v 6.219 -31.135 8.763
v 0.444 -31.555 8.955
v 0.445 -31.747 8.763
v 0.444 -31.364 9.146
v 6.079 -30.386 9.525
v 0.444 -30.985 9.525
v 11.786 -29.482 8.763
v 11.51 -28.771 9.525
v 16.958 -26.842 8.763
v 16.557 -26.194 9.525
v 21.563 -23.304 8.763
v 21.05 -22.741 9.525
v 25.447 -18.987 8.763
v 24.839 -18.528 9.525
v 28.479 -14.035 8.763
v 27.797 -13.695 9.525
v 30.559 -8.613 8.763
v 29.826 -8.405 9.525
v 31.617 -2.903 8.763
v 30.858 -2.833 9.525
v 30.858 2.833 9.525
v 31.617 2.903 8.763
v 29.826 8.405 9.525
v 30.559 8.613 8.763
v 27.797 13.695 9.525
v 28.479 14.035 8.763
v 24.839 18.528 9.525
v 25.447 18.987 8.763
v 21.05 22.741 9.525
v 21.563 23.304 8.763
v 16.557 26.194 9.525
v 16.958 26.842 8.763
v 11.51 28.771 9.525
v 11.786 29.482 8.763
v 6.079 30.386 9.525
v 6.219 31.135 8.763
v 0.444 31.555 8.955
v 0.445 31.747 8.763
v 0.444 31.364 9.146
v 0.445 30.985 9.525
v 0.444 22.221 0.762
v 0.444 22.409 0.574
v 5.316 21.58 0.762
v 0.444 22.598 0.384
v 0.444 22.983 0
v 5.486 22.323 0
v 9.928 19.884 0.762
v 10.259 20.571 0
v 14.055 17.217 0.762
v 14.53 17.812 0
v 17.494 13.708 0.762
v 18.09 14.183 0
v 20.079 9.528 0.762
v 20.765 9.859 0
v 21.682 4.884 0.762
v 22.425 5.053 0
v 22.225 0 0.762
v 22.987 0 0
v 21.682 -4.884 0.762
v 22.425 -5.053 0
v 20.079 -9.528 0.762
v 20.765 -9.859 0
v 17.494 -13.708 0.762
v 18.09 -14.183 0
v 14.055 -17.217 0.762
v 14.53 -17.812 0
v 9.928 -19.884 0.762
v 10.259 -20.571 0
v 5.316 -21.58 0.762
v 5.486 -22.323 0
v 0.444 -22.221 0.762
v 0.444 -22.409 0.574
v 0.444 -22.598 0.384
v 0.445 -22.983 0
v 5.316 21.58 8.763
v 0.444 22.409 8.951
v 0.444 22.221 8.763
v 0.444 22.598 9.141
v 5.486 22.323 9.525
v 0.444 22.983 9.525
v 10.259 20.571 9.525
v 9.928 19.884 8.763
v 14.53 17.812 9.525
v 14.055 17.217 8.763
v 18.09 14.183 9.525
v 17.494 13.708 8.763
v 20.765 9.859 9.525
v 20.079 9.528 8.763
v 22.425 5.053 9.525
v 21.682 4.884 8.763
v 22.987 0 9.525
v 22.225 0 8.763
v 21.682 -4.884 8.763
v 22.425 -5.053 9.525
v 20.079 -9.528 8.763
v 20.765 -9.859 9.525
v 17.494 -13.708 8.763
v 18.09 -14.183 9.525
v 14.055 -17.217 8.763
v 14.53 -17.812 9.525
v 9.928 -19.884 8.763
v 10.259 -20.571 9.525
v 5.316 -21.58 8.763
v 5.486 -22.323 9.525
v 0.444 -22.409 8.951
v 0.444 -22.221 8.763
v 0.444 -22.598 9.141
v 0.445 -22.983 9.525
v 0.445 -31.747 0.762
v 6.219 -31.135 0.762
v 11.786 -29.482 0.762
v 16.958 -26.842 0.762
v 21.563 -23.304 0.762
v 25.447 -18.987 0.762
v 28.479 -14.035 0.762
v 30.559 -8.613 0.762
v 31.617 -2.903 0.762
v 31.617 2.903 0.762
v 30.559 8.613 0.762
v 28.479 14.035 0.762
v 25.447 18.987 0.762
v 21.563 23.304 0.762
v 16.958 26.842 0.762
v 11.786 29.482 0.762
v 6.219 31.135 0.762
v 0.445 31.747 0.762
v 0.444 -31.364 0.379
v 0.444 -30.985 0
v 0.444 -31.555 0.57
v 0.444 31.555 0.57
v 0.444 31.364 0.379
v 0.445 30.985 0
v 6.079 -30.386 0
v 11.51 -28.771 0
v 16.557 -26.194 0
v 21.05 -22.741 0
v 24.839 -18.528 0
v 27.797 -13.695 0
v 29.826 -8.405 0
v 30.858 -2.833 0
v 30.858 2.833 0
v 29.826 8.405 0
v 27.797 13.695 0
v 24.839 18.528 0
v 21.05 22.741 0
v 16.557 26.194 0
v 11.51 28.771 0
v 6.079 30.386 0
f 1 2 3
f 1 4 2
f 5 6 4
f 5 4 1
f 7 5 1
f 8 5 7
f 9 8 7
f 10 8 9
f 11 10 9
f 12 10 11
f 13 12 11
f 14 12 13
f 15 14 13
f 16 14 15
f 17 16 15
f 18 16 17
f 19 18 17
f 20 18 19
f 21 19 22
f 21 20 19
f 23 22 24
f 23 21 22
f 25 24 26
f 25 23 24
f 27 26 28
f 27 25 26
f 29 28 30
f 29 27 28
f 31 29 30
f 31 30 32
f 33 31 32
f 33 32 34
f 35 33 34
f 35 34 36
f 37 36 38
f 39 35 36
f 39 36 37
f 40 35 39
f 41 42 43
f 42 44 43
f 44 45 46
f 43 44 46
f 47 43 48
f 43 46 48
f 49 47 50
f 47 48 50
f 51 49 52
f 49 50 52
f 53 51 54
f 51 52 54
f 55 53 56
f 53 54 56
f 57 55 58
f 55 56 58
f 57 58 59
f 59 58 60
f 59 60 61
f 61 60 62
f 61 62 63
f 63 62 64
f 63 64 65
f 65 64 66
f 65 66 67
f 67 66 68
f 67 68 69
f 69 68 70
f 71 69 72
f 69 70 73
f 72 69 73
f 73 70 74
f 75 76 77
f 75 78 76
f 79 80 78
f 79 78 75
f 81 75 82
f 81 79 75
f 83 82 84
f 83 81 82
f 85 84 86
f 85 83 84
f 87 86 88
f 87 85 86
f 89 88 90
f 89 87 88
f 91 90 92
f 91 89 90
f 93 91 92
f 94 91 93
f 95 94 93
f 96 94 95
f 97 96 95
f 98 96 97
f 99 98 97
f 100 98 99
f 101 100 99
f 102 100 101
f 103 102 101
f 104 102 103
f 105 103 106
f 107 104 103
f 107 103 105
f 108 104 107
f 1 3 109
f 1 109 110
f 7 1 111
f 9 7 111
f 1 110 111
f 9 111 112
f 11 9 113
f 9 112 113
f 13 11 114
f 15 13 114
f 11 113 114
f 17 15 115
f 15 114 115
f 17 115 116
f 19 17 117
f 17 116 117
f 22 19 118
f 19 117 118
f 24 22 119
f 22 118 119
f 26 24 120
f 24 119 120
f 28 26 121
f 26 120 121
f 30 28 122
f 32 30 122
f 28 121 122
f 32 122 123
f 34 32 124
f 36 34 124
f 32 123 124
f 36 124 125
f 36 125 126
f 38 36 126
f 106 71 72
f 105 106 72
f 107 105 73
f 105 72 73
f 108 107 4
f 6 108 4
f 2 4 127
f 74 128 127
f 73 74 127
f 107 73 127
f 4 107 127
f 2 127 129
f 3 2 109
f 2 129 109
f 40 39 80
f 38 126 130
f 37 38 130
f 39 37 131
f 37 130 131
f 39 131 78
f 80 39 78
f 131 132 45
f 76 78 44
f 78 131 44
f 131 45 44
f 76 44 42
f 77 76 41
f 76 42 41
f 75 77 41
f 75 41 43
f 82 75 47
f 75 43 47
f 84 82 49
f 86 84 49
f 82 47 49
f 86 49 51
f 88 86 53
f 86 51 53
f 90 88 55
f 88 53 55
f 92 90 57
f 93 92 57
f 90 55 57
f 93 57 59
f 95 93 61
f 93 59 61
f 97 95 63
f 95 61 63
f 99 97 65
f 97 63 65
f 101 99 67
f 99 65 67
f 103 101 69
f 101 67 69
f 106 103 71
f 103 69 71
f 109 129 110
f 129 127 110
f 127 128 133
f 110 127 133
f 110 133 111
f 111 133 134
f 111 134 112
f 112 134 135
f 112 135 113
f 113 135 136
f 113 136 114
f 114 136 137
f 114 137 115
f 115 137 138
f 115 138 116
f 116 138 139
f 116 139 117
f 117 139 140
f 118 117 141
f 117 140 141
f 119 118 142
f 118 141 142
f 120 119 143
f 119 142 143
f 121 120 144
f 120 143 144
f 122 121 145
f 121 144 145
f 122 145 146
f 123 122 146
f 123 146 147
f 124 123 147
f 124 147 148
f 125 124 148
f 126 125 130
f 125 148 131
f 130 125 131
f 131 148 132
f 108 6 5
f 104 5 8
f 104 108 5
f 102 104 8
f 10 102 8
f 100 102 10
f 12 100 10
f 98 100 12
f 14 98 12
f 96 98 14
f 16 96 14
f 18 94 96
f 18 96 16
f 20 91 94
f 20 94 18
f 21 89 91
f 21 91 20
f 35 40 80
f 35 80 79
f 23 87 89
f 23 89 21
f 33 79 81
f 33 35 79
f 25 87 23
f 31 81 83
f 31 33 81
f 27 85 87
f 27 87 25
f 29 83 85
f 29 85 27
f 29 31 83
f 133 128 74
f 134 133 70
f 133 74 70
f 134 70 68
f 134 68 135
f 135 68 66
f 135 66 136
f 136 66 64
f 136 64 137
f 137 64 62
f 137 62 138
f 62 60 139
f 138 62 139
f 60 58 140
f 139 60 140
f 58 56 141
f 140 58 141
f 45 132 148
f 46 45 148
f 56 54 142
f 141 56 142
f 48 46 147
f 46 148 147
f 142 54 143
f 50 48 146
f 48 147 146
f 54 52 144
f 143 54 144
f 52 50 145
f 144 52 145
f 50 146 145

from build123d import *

# Parameters (mm, degrees)
F1_DEPTH = 9.525
F2_SIZE  = 0.762


with BuildPart() as f1:
    # F0 (on Top) → F1 (new body)
    with BuildSketch(Plane.XY):
        with BuildLine():
            ThreePointArc((0.4445, 22.220555), (22.225, 0), (0.4445, -22.220555))
            Line((0.4445, -22.220555), (0.4445, -31.746888))
            ThreePointArc((0.4445, -31.746888), (31.75, 0), (0.4445, 31.746888))
            Line((0.4445, 31.746888), (0.4445, 22.220555))
        make_face()
    extrude(amount=F1_DEPTH)

    # F2
    f2_edges = [f1.edges().sort_by_distance(p)[0] for p in [
        (31.75, 0, 9.525),
        (31.75, 0, 0),
        (22.225, 0, 9.525),
        (22.225, 0, 0),
    ]]
    chamfer(f2_edges, length=F2_SIZE)


solid = f1.part
